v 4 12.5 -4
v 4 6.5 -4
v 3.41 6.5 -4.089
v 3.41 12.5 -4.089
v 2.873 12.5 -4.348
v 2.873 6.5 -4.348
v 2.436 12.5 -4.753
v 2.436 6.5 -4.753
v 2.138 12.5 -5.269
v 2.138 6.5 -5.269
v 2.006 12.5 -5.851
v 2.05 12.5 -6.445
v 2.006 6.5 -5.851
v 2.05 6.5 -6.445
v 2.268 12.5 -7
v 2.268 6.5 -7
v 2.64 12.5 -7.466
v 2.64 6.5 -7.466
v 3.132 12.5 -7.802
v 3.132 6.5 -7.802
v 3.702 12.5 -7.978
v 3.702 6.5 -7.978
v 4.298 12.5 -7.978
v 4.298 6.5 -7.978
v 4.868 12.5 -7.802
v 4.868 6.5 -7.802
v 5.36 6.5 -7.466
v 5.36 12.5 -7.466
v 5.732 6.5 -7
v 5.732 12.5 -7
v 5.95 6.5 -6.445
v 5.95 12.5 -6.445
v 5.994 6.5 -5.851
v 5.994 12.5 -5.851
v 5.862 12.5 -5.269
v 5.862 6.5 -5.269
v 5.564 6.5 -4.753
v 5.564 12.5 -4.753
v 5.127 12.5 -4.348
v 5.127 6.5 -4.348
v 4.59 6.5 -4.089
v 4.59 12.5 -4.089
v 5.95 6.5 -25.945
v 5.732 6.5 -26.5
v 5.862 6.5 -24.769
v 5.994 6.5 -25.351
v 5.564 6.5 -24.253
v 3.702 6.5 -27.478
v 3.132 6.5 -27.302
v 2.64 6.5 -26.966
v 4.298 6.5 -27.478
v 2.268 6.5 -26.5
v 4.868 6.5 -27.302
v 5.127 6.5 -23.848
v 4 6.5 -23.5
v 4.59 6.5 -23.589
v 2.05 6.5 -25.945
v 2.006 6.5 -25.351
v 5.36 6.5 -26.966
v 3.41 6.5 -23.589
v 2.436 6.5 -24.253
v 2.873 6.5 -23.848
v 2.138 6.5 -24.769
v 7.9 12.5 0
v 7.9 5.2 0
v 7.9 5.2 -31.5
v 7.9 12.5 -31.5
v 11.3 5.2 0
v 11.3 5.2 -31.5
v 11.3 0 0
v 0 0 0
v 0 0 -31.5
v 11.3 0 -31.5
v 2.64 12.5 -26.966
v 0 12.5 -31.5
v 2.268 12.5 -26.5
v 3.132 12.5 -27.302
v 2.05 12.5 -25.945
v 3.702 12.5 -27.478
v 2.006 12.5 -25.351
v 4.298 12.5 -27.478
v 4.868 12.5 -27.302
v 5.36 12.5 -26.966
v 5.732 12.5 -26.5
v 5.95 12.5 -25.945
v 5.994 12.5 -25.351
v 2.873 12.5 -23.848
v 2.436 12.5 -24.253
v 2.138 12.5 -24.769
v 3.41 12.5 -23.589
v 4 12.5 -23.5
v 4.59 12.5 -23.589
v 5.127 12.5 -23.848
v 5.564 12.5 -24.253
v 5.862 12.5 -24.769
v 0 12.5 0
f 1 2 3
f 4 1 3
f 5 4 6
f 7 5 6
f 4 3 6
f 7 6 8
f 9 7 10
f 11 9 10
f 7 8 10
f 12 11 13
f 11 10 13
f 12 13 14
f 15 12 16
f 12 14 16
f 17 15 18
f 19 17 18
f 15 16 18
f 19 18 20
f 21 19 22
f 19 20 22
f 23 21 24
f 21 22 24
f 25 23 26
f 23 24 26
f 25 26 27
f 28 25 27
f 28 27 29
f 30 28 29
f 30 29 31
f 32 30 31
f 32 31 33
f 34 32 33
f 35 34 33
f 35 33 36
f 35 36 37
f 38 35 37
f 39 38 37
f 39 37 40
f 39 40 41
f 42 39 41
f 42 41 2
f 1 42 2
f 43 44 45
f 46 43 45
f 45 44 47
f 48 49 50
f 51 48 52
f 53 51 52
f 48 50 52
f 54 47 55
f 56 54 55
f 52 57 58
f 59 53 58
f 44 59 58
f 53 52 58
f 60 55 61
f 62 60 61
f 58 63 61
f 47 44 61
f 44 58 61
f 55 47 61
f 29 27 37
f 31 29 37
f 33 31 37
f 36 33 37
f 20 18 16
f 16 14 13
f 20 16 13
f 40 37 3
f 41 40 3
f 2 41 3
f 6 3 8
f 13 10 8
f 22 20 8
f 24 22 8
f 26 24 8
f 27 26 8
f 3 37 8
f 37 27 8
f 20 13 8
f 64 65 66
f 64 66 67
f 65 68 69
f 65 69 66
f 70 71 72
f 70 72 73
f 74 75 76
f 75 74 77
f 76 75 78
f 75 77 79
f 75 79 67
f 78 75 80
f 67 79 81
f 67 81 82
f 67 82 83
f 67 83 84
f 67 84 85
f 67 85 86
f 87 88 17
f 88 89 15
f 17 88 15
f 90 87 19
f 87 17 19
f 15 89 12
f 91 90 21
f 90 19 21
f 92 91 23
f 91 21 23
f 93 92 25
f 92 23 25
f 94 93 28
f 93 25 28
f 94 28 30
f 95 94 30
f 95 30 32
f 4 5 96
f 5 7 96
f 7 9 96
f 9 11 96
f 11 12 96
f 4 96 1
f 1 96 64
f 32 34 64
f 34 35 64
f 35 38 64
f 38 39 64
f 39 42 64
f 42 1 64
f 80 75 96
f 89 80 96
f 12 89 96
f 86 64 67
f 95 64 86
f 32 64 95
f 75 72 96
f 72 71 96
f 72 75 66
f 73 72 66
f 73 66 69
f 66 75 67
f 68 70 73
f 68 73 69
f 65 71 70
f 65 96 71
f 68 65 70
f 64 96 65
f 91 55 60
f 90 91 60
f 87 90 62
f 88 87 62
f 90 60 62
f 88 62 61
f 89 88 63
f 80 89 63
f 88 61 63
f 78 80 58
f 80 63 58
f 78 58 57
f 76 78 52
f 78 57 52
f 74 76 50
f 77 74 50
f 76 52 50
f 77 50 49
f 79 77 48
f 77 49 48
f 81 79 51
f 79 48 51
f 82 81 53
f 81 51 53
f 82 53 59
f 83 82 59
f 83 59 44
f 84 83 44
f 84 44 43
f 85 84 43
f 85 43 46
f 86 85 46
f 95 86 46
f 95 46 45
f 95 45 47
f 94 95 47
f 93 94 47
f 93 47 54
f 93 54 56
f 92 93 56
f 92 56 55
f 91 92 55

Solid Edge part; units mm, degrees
sketch "Sketch1" plane through (0, 0, 0) normal (0, 0, 1) x (1, 0, 0)
  line L0 (7.9, 5.2) -> (7.9, 12.5)
  line L1 (0, 12.5) -> (7.9, 12.5)
  line L2 (0, 0) -> (0, 12.5)
  line L3 (0, 0) -> (11.3, 0)
  line L4 (11.3, 0) -> (11.3, 5.2)
  line L5 (11.3, 5.2) -> (7.9, 5.2)
extrude "Protrusion1" add sketch "Sketch1" against normal blind 31.5
hole "Hole_1" at (4, 12.5, -25.5) direction (0, -1, 0) diameter 4 depth 6
hole "Hole1" at (4, 12.5, -6) direction (0, -1, 0) diameter 4 depth 6
